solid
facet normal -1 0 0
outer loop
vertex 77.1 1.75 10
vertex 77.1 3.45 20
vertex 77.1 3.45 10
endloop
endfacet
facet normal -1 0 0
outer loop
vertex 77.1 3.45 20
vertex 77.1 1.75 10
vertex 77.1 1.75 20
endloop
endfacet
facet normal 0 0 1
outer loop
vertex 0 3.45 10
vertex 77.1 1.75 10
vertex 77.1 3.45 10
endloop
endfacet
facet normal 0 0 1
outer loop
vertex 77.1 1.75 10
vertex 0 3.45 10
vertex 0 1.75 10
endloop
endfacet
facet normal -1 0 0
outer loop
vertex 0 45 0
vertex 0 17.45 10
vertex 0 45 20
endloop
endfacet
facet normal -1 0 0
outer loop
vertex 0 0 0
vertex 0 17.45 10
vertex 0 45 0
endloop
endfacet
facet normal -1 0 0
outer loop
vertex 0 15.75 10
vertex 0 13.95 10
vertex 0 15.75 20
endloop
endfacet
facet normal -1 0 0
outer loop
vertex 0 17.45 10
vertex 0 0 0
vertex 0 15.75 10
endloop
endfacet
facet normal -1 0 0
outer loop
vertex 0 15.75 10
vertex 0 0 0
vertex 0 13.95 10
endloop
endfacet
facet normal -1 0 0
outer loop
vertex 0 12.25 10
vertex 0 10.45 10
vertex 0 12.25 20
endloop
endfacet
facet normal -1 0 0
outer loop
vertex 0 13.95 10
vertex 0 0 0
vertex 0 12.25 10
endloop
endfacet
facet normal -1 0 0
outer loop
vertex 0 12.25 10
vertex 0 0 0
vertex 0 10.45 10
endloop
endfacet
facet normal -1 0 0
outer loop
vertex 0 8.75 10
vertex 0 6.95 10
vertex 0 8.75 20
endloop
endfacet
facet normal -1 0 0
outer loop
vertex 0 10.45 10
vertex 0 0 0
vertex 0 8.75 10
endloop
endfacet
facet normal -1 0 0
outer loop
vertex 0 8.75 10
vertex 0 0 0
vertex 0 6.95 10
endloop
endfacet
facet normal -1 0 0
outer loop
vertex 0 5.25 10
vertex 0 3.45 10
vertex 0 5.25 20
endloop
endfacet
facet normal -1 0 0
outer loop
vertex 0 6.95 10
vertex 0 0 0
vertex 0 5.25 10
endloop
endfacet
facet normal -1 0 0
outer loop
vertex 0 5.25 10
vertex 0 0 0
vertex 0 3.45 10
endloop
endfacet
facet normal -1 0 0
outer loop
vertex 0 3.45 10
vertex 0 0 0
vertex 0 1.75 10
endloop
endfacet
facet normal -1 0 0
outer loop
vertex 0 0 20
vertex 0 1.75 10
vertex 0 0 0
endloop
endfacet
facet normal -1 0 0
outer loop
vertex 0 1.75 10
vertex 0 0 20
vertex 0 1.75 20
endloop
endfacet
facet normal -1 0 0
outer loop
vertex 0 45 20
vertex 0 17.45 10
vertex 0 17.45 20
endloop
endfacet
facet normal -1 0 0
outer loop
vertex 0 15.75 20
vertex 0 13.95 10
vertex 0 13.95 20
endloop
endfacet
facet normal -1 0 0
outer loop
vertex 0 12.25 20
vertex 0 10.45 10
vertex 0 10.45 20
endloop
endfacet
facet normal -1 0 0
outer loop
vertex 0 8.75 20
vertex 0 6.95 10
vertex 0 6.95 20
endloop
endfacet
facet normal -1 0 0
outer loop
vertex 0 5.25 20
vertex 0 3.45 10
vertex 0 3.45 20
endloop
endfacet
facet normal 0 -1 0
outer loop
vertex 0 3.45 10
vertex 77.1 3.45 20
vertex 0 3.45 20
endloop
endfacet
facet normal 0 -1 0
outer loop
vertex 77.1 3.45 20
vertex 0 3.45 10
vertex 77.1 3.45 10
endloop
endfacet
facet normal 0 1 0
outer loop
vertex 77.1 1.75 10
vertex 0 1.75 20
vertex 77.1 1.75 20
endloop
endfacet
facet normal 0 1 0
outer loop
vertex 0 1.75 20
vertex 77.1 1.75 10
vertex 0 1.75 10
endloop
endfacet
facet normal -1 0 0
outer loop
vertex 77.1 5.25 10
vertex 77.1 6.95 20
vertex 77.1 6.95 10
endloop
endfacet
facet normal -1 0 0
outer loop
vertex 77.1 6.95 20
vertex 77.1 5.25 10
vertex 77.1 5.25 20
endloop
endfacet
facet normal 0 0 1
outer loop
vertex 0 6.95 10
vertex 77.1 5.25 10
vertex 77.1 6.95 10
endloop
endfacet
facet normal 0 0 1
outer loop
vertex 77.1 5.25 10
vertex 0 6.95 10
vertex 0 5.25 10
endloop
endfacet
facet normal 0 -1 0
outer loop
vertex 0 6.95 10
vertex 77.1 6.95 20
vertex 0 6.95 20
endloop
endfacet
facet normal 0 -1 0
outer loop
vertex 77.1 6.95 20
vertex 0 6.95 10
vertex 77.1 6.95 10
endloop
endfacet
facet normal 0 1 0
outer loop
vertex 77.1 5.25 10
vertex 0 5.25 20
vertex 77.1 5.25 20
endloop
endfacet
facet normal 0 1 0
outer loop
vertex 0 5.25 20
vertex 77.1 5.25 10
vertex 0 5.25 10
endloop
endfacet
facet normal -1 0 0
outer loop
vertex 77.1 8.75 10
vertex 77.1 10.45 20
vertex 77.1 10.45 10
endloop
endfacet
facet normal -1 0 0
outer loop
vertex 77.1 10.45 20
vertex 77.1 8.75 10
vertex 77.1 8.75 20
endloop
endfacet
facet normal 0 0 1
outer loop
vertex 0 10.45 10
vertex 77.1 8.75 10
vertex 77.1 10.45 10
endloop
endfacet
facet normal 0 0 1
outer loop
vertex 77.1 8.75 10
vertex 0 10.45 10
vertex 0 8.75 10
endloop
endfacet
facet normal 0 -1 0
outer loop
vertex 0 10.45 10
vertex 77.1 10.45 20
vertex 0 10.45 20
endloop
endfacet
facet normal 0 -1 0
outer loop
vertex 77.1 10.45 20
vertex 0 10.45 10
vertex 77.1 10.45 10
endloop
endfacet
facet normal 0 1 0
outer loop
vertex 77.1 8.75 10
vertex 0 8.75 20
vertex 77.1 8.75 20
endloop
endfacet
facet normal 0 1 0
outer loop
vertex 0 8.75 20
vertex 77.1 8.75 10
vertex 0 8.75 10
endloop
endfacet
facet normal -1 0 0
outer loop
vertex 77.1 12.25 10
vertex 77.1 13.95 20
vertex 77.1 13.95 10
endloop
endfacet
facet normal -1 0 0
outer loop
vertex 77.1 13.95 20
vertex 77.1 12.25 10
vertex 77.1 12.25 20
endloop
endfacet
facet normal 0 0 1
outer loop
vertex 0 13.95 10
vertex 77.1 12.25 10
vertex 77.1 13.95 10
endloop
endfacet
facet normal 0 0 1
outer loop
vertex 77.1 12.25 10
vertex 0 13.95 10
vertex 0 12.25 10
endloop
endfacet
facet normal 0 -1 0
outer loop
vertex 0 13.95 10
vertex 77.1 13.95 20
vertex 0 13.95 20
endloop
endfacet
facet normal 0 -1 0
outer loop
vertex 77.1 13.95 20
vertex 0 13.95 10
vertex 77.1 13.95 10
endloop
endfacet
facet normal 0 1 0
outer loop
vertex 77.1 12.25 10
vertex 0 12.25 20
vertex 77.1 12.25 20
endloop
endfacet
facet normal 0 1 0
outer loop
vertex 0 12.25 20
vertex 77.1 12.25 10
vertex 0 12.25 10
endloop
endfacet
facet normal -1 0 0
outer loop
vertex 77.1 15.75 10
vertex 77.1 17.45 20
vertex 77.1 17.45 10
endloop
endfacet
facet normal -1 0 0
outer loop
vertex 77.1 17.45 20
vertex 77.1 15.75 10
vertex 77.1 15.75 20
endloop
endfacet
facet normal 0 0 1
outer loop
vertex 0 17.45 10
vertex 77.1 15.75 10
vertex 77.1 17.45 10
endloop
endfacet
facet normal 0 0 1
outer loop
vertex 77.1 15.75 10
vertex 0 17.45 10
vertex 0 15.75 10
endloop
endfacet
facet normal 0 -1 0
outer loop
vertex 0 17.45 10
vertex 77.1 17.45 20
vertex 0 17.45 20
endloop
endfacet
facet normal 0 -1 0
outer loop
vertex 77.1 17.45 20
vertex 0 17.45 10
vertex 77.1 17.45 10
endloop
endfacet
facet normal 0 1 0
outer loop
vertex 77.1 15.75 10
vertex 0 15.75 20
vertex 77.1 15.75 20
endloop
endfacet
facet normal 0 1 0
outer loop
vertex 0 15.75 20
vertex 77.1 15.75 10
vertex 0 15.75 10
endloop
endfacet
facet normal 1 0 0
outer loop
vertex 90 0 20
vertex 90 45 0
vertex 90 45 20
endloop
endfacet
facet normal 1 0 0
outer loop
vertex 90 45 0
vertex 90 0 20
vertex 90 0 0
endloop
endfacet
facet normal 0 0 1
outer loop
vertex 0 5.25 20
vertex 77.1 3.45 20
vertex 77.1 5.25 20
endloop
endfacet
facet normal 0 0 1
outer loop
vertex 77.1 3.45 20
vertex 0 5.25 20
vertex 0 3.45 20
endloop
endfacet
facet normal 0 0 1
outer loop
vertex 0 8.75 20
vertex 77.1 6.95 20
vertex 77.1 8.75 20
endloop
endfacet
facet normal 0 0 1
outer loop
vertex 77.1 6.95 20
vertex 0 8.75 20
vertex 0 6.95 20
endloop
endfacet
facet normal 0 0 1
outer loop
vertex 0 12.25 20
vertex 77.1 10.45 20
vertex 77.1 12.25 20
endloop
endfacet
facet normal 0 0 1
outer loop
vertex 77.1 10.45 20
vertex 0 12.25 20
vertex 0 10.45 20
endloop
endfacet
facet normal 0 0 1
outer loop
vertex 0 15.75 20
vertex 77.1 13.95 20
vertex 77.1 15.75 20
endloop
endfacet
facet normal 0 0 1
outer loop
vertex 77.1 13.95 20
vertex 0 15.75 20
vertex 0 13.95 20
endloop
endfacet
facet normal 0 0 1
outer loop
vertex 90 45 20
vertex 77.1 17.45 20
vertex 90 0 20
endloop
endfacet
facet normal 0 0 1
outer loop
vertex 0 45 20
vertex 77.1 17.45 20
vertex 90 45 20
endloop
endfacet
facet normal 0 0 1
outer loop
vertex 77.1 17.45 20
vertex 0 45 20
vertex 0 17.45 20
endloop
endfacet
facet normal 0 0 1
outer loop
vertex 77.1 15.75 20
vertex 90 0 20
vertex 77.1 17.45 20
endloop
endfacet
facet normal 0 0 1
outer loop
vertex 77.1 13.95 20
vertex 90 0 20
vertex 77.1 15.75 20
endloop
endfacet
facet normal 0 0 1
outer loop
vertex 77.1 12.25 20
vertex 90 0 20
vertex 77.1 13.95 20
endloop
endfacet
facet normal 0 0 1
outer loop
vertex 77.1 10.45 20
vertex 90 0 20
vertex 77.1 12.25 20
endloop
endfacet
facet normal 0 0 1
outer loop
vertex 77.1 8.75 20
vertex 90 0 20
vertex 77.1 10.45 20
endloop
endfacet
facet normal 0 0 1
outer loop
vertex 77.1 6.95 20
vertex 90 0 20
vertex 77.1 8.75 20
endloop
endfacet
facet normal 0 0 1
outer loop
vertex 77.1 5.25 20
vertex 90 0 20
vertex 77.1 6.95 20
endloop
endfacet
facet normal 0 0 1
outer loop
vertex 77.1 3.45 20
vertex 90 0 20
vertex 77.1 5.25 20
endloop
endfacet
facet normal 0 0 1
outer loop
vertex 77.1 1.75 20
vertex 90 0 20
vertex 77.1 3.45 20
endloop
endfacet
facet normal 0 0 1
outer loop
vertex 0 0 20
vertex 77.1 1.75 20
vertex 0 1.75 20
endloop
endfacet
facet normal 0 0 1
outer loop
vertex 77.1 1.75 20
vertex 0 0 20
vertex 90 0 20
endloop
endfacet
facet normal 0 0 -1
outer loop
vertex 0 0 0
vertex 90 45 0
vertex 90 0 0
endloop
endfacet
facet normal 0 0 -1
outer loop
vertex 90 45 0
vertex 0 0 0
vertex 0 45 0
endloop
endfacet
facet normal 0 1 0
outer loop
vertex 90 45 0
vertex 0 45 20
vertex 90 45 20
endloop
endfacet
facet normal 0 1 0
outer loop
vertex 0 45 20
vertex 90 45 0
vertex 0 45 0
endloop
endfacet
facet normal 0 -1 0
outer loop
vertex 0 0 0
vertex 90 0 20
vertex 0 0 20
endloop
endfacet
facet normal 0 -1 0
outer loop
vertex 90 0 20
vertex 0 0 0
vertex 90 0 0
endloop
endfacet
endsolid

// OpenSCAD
// Drying Rack for 10 Microscope Slides
// Base: 90 x 45 x 20 mm
// Slots: 10 parallel slots, 77mm long, 1.6mm wide, 10mm deep
// Spacing: 3.5mm centre-to-centre (Y)

$fn = 128; // High resolution for smooth slot edges

// Base Dimensions
base_length = 90;  // X
base_width = 45;   // Y
base_height = 20;  // Z

// Slot Dimensions
slot_length = 77;  // X
slot_width = 1.6;  // Y
slot_depth = 10;   // Z (cut depth)

// Layout
num_slots = 10;
slot_spacing = 3.5; // Centre-to-centre in Y

// Calculate Y position of the first slot centre
// The group of centres is symmetric around 0.
// First slot centre = - ( (num_slots - 1) * slot_spacing ) / 2
first_slot_y = -((num_slots - 1) * slot_spacing) / 2;

// Generate the main block
difference() {
    // 1. Create the solid base block
    translate([0, 0, 0])
    cube([base_length, base_width, base_height]);

    // 2. Cut the 10 slots
    // Slots run along X, so they are extruded in X direction.
    // We define a slot shape and rotate/extrude it, or simply translate it.
    // Since slots are parallel to X, we can define a rectangle in YZ plane and extrude along X.
    
    for (i = [0 : num_slots - 1]) {
        // Calculate Y position for this slot
        y_pos = first_slot_y + i * slot_spacing;
        
        // Define the slot cutter
        // The slot is 77mm long (X), 1.6mm wide (Y), 10mm deep (Z)
        // We need to cut from the top surface (z=20) down to z=10.
        // To ensure clean cuts, we extend slightly past the faces.
        
        translate([
            0,              // X offset (centered on block length)
            y_pos,          // Y offset
            base_height - slot_depth // Z offset (start at top surface)
        ])
        cube([
            slot_length + 0.1, // X: slightly longer than slot_length to cut edges
            slot_width + 0.1,  // Y: slightly wider
            slot_depth + 0.1   // Z: slightly deeper
        ]);
    }
}
